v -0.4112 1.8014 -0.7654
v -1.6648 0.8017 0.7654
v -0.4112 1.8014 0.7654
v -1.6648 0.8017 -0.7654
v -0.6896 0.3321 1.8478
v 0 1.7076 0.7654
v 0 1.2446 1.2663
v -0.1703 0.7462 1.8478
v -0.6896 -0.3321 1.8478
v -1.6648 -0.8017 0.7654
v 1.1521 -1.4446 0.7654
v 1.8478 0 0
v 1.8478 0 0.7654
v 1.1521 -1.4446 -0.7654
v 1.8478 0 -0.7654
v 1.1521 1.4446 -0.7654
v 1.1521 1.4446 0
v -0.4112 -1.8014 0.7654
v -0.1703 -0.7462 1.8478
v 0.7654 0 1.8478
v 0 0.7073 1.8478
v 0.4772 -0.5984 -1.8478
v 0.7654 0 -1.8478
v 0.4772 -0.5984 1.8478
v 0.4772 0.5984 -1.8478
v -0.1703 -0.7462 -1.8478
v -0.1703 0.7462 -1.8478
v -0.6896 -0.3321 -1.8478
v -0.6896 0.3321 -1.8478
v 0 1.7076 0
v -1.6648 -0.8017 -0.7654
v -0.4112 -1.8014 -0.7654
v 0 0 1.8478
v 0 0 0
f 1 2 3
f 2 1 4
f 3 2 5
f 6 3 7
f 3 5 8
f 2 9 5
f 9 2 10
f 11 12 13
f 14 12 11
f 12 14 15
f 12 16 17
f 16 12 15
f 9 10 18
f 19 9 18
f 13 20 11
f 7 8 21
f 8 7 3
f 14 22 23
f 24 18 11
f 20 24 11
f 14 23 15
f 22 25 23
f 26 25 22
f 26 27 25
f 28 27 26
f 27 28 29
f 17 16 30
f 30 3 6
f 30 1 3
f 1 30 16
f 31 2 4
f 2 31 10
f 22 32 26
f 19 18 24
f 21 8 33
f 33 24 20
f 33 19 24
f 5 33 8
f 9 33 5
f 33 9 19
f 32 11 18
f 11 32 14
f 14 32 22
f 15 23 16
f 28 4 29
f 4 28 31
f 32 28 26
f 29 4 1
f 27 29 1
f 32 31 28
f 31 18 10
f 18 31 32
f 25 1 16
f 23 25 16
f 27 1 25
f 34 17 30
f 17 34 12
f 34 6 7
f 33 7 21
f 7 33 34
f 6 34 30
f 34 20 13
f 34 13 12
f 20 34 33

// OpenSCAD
difference() {
  color("green") sphere(2);
  color("blue") cube(3);
}
